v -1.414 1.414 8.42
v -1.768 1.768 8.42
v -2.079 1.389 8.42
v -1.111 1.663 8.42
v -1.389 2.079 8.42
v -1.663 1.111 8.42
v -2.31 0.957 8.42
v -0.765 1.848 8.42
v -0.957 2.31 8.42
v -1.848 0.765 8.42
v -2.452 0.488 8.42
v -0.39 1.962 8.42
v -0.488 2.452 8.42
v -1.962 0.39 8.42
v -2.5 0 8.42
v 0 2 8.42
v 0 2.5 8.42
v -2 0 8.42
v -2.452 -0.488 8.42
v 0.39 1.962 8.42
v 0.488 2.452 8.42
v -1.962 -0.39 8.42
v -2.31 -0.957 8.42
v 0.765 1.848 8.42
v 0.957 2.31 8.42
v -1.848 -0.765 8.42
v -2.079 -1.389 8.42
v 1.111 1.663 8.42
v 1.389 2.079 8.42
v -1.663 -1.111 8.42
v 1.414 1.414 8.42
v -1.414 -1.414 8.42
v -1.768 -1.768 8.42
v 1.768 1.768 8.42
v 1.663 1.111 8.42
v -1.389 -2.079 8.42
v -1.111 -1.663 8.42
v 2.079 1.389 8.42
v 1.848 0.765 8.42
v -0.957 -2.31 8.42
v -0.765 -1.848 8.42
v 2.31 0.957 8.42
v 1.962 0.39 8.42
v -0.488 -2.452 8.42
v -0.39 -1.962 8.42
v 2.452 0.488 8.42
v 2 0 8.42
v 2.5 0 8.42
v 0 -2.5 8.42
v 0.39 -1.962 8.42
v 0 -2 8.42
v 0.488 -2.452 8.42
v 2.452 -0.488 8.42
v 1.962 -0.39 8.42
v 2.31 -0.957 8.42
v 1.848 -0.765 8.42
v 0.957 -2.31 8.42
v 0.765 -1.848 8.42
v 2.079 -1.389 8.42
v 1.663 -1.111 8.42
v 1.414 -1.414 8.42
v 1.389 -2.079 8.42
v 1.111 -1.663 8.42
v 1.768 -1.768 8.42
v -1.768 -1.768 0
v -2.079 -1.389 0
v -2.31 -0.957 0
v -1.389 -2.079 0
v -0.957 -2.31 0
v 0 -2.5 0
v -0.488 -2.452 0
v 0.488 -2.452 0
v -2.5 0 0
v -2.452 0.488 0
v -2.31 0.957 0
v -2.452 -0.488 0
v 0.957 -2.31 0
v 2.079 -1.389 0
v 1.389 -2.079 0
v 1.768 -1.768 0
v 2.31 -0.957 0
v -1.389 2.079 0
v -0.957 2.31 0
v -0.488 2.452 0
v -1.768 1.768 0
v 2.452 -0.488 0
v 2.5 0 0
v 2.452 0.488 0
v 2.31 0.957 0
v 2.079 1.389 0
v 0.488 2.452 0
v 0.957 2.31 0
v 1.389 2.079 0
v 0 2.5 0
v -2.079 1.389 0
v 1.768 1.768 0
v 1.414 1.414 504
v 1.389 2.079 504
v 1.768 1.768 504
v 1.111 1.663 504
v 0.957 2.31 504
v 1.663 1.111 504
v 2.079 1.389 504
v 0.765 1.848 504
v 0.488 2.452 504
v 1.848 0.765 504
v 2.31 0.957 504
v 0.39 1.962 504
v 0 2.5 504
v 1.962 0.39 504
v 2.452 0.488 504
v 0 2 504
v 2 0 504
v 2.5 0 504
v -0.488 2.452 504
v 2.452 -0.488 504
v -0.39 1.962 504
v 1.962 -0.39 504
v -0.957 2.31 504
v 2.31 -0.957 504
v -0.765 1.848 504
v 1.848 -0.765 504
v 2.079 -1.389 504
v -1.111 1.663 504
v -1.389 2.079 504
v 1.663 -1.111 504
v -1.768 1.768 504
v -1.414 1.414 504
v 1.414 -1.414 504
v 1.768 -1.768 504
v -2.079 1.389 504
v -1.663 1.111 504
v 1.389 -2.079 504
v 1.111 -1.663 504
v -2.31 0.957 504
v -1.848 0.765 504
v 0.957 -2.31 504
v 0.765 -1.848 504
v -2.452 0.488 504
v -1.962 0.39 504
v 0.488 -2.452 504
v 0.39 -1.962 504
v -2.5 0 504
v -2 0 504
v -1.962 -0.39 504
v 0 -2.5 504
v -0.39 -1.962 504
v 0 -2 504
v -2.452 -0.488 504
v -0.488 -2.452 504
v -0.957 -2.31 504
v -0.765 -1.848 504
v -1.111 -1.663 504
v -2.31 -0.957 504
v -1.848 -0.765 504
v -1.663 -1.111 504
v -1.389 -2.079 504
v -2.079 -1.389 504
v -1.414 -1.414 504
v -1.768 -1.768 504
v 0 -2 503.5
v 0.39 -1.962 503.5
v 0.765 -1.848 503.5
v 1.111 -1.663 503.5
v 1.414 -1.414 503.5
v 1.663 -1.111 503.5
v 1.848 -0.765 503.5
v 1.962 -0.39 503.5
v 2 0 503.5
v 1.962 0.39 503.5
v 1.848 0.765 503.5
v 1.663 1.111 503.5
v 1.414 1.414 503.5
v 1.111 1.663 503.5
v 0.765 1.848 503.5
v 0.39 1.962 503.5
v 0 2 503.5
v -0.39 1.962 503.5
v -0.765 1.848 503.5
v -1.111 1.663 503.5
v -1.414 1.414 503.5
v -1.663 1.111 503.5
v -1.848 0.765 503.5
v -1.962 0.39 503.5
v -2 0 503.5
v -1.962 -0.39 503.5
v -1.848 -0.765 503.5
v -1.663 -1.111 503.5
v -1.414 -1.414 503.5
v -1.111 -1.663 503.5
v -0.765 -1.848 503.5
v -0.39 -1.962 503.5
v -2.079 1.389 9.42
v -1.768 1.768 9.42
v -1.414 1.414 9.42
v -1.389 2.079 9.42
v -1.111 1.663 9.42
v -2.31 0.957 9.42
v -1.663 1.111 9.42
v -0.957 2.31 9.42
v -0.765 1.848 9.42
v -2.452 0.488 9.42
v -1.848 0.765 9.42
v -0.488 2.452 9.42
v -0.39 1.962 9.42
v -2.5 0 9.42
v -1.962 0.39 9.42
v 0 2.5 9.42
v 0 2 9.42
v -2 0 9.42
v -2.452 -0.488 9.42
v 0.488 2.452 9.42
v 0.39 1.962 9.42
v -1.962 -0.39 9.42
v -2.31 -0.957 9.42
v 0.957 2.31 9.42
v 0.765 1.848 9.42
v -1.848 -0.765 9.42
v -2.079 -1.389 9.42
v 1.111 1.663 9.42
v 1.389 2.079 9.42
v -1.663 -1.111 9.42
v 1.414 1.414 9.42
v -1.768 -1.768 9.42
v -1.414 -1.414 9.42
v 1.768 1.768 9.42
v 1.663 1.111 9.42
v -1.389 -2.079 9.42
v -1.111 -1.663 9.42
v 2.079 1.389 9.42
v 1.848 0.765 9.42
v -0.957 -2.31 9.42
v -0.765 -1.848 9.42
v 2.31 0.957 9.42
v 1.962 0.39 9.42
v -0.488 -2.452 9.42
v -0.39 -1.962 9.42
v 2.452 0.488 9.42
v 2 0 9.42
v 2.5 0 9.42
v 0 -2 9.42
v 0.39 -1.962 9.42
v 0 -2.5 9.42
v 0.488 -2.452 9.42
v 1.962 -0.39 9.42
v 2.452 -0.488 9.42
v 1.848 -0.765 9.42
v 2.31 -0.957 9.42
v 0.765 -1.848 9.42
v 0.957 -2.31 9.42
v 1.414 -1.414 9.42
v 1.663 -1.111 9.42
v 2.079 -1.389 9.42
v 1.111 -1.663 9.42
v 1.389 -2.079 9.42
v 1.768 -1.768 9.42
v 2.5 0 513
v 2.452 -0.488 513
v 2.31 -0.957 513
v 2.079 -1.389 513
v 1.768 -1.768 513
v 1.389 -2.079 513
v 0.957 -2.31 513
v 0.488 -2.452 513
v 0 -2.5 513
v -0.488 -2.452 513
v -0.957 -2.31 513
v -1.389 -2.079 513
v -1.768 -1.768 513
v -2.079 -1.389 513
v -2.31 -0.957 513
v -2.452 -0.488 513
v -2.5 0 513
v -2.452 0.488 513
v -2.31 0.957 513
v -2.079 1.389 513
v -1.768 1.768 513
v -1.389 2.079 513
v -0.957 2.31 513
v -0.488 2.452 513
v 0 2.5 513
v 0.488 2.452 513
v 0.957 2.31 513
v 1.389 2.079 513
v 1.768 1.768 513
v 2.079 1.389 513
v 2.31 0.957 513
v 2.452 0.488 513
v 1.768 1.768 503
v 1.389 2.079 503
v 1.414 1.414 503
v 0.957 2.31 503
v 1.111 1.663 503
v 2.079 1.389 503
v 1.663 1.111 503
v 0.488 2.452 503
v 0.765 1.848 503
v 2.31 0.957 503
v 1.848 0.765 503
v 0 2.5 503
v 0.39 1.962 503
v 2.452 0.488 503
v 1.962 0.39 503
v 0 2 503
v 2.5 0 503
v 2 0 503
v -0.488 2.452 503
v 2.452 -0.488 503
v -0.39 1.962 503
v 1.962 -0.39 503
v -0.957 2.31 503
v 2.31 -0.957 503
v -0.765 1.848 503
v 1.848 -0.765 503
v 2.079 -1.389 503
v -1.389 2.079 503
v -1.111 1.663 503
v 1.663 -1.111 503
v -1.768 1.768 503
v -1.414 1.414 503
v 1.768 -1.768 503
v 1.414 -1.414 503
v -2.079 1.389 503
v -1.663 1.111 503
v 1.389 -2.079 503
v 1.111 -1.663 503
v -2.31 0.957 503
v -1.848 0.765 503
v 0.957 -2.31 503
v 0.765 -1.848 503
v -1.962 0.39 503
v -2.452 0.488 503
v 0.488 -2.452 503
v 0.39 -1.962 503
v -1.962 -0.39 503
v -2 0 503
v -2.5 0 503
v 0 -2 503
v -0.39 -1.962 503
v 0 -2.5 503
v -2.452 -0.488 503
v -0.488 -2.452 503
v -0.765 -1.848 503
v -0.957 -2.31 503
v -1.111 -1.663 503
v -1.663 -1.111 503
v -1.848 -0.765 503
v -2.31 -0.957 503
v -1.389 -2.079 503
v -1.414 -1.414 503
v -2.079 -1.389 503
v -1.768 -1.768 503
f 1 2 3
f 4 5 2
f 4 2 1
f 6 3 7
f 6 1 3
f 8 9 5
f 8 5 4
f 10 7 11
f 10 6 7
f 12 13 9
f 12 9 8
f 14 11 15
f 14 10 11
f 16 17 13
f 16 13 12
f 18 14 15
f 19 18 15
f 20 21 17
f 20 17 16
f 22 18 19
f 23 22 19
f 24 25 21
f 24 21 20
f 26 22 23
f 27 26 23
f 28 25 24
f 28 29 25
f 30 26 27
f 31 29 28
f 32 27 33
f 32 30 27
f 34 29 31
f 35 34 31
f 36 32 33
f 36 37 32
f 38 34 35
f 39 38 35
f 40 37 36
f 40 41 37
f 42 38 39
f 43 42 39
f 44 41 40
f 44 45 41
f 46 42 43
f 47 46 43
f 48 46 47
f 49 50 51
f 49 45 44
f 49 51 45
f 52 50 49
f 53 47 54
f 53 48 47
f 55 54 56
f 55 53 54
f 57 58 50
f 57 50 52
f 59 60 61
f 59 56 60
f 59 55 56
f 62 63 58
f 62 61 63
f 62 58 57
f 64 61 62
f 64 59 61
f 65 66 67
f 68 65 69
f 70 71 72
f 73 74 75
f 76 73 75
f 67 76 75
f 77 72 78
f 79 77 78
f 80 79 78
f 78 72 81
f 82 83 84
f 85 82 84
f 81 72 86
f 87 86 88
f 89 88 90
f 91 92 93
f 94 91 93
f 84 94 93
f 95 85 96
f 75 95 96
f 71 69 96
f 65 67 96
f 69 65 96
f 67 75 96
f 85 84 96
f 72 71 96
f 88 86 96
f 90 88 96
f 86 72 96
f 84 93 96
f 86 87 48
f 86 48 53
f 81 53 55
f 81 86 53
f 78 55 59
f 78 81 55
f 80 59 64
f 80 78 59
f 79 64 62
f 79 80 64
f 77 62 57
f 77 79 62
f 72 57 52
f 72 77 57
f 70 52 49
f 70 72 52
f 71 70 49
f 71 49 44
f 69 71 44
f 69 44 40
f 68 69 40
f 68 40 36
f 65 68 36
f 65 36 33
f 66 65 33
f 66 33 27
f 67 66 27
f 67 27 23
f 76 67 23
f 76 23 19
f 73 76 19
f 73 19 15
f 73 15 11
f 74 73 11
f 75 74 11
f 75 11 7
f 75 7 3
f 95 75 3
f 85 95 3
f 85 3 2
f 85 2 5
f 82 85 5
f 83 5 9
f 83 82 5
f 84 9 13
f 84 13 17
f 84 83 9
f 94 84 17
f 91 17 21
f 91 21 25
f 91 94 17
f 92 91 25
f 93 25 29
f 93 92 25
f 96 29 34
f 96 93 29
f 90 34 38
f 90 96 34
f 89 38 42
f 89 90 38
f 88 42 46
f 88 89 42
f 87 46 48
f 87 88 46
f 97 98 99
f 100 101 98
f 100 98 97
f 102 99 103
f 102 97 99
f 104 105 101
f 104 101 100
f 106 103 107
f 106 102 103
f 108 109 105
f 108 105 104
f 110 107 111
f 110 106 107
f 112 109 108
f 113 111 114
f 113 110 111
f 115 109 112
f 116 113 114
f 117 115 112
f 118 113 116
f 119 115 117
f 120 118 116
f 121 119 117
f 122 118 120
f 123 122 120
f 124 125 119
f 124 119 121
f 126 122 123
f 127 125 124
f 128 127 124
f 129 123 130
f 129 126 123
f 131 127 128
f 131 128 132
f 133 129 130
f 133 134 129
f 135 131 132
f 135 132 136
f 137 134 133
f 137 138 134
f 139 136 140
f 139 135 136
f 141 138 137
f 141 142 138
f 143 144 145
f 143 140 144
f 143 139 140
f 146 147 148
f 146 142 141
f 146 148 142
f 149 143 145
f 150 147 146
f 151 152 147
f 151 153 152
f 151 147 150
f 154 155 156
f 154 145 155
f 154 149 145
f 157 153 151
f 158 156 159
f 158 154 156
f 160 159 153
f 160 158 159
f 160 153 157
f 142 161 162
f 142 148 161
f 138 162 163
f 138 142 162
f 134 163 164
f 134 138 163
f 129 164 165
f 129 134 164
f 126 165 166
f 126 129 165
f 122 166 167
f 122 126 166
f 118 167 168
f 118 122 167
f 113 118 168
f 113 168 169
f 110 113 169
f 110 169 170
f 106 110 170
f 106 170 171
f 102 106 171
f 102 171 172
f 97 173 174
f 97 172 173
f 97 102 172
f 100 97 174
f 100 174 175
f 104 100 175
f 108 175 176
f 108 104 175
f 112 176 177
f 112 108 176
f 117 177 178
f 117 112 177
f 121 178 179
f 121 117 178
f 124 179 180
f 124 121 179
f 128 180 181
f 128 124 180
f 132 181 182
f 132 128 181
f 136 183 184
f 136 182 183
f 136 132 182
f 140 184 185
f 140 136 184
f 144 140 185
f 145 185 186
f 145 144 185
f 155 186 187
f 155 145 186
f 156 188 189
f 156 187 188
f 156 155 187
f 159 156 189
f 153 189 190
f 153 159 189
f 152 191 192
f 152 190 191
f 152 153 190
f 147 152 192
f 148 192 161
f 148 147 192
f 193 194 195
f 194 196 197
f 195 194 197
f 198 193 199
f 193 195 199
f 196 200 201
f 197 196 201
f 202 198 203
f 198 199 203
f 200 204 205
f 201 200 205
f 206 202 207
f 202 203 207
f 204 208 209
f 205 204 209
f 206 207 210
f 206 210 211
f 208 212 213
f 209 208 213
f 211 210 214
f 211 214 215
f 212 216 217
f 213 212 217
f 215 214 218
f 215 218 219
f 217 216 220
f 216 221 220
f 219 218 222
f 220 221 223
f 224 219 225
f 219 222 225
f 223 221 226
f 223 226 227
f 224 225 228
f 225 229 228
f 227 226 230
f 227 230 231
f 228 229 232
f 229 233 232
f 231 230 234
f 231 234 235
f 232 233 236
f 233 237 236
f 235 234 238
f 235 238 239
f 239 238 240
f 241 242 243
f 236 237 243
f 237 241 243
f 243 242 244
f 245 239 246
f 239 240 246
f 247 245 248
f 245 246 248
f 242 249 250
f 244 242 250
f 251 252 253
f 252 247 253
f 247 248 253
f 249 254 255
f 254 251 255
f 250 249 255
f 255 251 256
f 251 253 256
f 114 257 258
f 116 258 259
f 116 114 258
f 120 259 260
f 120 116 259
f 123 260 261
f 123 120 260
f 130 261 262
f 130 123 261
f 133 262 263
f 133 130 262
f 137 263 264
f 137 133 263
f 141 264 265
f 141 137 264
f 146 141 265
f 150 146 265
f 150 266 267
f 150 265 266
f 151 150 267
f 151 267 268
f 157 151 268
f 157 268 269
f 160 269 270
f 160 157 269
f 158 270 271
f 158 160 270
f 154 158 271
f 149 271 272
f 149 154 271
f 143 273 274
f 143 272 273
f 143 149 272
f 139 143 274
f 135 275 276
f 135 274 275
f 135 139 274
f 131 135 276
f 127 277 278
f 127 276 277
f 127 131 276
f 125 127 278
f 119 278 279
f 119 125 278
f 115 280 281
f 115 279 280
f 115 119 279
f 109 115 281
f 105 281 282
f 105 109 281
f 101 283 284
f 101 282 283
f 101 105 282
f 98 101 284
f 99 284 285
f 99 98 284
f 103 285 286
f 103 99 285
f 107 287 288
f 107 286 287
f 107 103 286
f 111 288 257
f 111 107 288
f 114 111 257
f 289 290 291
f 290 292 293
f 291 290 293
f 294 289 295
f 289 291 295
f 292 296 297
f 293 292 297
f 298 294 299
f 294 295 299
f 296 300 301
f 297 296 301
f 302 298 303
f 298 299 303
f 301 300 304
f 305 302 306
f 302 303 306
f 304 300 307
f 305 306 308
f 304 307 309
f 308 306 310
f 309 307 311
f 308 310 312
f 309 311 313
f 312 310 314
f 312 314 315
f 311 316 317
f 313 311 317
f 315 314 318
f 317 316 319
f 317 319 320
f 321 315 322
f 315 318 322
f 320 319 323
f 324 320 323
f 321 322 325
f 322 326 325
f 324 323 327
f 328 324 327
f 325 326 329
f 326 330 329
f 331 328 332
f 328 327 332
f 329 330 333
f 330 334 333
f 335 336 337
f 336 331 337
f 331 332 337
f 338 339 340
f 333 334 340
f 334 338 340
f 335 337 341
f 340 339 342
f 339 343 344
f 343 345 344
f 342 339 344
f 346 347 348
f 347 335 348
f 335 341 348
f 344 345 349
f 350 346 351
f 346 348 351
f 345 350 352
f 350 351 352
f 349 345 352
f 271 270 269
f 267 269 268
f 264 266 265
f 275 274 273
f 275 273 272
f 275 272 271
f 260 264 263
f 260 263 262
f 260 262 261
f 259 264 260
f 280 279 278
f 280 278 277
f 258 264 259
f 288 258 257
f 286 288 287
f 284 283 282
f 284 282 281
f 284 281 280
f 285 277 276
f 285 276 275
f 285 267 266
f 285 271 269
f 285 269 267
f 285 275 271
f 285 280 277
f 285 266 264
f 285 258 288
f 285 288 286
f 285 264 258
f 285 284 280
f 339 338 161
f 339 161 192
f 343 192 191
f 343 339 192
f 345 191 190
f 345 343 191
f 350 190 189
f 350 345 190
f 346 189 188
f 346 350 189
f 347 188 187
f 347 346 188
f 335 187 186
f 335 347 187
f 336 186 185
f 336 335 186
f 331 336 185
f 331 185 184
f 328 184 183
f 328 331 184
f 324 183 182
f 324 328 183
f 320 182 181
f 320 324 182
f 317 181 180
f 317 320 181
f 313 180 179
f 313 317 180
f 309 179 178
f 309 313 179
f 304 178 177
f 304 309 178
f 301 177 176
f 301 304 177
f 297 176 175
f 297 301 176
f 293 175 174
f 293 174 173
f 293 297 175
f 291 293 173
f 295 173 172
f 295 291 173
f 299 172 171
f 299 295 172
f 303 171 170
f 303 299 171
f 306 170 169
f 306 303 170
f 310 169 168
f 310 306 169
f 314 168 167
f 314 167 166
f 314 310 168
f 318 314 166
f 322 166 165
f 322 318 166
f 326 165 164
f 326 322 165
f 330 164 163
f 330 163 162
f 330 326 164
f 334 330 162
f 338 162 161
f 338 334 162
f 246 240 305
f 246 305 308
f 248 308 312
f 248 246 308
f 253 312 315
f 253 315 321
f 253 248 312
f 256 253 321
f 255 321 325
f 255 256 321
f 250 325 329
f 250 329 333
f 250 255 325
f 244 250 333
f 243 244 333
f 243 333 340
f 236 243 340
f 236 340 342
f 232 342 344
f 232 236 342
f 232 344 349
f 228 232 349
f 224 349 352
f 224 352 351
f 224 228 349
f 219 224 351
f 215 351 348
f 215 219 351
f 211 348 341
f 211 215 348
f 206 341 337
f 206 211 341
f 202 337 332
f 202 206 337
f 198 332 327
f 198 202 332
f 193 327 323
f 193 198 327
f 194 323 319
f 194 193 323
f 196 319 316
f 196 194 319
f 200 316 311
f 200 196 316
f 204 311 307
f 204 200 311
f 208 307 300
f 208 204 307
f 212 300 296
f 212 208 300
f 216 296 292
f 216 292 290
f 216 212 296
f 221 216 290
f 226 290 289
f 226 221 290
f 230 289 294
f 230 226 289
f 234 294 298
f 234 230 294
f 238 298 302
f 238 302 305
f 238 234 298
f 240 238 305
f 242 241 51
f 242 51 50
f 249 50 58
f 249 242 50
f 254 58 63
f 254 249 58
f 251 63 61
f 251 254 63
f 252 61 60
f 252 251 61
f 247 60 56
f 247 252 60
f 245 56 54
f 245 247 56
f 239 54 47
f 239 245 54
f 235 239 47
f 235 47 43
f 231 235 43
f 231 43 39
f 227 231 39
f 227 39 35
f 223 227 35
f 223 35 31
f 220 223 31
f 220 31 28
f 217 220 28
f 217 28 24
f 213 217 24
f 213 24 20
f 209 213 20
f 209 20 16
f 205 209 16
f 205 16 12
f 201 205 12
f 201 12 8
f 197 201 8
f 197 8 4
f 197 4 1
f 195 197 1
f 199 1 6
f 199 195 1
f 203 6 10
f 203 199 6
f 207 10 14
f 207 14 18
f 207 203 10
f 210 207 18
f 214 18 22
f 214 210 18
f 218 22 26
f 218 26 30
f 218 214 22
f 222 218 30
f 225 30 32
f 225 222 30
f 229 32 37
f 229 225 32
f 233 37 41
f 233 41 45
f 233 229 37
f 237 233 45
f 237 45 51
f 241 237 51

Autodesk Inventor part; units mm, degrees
ref_plane "YZ Plane" through (0, 0, 0) normal (1, 0, 0) x (0, 1, 0)
ref_plane "XZ Plane" through (0, 0, 0) normal (0, 1, 0) x (-1, 0, 0)
ref_plane "XY Plane" through (0, 0, 0) normal (0, 0, 1) x (1, 0, 0)
sketch "Boceto1" plane through (0, 0, 0) normal (0, 0, 1) x (1, 0, 0)
  circle A0 centre (0, 0) radius 2.5
  dimension "d1" = 5
extrude "Extrusión1" add sketch "Boceto1" along normal blind 513
sketch "Boceto2" plane through (0, 0, 0) normal (1, 0, 0) x (0, 1, 0)
  line L0 (0, 0) -> (0, 8.92)
  line L1 (0, 8.92) -> (-2.5, 8.92)
  line L2 (-2.5, 0) -> (-2.5, 513) projected
  line L3 (-2.5, 0) -> (-2.5, 513) projected
  line L4 (-2.5, 8.42) -> (-2, 8.42)
  line L5 (-2, 8.42) -> (-2, 9.42)
  line L6 (-2, 9.42) -> (-2.5, 9.42)
  line L7 (-2.5, 9.42) -> (-2.5, 8.42)
  dimension "d4" = 8.92
revolve "Revolución1" cut sketch "Boceto2" angle 360 about axis through (0, 0, 0) along (0, 0, 1)
sketch "Boceto3" plane through (0, 0, 0) normal (1, 0, 0) x (0, 1, 0)
  line L0 (2.5, 513) -> (-2.5, 513) projected
  line L1 (0, 513) -> (0, 503.5)
  line L2 (0, 503.5) -> (-2.5, 503.5)
  line L3 (-2.5, 9.42) -> (-2.5, 513) projected
  line L4 (-2.5, 503.5) -> (-2, 503.5)
  line L5 (-2, 503.5) -> (-2, 503)
  line L6 (-2, 503) -> (-2.5, 503)
  line L7 (-2.5, 503) -> (-2.5, 503.5)
  line L8 (-2.5, 503.5) -> (-2, 503.5)
  line L9 (-2, 503.5) -> (-2, 504)
  line L10 (-2, 504) -> (-2.5, 504)
  line L11 (-2.5, 504) -> (-2.5, 503.5)
  point P0 (0, 0)
  dimension "d8" = 9.5
  dimension "d9" = 0.5
  dimension "d10" = 0.5
  dimension "d11" = 0.5
  dimension "d12" = 0.5
revolve "Revolución2" cut sketch "Boceto3" angle 360 about axis through (0, 0, 513) along (0, 0, -1) contours L10 L9 L2 L3 | L5 L6 L3 L2
properties part number "union"
